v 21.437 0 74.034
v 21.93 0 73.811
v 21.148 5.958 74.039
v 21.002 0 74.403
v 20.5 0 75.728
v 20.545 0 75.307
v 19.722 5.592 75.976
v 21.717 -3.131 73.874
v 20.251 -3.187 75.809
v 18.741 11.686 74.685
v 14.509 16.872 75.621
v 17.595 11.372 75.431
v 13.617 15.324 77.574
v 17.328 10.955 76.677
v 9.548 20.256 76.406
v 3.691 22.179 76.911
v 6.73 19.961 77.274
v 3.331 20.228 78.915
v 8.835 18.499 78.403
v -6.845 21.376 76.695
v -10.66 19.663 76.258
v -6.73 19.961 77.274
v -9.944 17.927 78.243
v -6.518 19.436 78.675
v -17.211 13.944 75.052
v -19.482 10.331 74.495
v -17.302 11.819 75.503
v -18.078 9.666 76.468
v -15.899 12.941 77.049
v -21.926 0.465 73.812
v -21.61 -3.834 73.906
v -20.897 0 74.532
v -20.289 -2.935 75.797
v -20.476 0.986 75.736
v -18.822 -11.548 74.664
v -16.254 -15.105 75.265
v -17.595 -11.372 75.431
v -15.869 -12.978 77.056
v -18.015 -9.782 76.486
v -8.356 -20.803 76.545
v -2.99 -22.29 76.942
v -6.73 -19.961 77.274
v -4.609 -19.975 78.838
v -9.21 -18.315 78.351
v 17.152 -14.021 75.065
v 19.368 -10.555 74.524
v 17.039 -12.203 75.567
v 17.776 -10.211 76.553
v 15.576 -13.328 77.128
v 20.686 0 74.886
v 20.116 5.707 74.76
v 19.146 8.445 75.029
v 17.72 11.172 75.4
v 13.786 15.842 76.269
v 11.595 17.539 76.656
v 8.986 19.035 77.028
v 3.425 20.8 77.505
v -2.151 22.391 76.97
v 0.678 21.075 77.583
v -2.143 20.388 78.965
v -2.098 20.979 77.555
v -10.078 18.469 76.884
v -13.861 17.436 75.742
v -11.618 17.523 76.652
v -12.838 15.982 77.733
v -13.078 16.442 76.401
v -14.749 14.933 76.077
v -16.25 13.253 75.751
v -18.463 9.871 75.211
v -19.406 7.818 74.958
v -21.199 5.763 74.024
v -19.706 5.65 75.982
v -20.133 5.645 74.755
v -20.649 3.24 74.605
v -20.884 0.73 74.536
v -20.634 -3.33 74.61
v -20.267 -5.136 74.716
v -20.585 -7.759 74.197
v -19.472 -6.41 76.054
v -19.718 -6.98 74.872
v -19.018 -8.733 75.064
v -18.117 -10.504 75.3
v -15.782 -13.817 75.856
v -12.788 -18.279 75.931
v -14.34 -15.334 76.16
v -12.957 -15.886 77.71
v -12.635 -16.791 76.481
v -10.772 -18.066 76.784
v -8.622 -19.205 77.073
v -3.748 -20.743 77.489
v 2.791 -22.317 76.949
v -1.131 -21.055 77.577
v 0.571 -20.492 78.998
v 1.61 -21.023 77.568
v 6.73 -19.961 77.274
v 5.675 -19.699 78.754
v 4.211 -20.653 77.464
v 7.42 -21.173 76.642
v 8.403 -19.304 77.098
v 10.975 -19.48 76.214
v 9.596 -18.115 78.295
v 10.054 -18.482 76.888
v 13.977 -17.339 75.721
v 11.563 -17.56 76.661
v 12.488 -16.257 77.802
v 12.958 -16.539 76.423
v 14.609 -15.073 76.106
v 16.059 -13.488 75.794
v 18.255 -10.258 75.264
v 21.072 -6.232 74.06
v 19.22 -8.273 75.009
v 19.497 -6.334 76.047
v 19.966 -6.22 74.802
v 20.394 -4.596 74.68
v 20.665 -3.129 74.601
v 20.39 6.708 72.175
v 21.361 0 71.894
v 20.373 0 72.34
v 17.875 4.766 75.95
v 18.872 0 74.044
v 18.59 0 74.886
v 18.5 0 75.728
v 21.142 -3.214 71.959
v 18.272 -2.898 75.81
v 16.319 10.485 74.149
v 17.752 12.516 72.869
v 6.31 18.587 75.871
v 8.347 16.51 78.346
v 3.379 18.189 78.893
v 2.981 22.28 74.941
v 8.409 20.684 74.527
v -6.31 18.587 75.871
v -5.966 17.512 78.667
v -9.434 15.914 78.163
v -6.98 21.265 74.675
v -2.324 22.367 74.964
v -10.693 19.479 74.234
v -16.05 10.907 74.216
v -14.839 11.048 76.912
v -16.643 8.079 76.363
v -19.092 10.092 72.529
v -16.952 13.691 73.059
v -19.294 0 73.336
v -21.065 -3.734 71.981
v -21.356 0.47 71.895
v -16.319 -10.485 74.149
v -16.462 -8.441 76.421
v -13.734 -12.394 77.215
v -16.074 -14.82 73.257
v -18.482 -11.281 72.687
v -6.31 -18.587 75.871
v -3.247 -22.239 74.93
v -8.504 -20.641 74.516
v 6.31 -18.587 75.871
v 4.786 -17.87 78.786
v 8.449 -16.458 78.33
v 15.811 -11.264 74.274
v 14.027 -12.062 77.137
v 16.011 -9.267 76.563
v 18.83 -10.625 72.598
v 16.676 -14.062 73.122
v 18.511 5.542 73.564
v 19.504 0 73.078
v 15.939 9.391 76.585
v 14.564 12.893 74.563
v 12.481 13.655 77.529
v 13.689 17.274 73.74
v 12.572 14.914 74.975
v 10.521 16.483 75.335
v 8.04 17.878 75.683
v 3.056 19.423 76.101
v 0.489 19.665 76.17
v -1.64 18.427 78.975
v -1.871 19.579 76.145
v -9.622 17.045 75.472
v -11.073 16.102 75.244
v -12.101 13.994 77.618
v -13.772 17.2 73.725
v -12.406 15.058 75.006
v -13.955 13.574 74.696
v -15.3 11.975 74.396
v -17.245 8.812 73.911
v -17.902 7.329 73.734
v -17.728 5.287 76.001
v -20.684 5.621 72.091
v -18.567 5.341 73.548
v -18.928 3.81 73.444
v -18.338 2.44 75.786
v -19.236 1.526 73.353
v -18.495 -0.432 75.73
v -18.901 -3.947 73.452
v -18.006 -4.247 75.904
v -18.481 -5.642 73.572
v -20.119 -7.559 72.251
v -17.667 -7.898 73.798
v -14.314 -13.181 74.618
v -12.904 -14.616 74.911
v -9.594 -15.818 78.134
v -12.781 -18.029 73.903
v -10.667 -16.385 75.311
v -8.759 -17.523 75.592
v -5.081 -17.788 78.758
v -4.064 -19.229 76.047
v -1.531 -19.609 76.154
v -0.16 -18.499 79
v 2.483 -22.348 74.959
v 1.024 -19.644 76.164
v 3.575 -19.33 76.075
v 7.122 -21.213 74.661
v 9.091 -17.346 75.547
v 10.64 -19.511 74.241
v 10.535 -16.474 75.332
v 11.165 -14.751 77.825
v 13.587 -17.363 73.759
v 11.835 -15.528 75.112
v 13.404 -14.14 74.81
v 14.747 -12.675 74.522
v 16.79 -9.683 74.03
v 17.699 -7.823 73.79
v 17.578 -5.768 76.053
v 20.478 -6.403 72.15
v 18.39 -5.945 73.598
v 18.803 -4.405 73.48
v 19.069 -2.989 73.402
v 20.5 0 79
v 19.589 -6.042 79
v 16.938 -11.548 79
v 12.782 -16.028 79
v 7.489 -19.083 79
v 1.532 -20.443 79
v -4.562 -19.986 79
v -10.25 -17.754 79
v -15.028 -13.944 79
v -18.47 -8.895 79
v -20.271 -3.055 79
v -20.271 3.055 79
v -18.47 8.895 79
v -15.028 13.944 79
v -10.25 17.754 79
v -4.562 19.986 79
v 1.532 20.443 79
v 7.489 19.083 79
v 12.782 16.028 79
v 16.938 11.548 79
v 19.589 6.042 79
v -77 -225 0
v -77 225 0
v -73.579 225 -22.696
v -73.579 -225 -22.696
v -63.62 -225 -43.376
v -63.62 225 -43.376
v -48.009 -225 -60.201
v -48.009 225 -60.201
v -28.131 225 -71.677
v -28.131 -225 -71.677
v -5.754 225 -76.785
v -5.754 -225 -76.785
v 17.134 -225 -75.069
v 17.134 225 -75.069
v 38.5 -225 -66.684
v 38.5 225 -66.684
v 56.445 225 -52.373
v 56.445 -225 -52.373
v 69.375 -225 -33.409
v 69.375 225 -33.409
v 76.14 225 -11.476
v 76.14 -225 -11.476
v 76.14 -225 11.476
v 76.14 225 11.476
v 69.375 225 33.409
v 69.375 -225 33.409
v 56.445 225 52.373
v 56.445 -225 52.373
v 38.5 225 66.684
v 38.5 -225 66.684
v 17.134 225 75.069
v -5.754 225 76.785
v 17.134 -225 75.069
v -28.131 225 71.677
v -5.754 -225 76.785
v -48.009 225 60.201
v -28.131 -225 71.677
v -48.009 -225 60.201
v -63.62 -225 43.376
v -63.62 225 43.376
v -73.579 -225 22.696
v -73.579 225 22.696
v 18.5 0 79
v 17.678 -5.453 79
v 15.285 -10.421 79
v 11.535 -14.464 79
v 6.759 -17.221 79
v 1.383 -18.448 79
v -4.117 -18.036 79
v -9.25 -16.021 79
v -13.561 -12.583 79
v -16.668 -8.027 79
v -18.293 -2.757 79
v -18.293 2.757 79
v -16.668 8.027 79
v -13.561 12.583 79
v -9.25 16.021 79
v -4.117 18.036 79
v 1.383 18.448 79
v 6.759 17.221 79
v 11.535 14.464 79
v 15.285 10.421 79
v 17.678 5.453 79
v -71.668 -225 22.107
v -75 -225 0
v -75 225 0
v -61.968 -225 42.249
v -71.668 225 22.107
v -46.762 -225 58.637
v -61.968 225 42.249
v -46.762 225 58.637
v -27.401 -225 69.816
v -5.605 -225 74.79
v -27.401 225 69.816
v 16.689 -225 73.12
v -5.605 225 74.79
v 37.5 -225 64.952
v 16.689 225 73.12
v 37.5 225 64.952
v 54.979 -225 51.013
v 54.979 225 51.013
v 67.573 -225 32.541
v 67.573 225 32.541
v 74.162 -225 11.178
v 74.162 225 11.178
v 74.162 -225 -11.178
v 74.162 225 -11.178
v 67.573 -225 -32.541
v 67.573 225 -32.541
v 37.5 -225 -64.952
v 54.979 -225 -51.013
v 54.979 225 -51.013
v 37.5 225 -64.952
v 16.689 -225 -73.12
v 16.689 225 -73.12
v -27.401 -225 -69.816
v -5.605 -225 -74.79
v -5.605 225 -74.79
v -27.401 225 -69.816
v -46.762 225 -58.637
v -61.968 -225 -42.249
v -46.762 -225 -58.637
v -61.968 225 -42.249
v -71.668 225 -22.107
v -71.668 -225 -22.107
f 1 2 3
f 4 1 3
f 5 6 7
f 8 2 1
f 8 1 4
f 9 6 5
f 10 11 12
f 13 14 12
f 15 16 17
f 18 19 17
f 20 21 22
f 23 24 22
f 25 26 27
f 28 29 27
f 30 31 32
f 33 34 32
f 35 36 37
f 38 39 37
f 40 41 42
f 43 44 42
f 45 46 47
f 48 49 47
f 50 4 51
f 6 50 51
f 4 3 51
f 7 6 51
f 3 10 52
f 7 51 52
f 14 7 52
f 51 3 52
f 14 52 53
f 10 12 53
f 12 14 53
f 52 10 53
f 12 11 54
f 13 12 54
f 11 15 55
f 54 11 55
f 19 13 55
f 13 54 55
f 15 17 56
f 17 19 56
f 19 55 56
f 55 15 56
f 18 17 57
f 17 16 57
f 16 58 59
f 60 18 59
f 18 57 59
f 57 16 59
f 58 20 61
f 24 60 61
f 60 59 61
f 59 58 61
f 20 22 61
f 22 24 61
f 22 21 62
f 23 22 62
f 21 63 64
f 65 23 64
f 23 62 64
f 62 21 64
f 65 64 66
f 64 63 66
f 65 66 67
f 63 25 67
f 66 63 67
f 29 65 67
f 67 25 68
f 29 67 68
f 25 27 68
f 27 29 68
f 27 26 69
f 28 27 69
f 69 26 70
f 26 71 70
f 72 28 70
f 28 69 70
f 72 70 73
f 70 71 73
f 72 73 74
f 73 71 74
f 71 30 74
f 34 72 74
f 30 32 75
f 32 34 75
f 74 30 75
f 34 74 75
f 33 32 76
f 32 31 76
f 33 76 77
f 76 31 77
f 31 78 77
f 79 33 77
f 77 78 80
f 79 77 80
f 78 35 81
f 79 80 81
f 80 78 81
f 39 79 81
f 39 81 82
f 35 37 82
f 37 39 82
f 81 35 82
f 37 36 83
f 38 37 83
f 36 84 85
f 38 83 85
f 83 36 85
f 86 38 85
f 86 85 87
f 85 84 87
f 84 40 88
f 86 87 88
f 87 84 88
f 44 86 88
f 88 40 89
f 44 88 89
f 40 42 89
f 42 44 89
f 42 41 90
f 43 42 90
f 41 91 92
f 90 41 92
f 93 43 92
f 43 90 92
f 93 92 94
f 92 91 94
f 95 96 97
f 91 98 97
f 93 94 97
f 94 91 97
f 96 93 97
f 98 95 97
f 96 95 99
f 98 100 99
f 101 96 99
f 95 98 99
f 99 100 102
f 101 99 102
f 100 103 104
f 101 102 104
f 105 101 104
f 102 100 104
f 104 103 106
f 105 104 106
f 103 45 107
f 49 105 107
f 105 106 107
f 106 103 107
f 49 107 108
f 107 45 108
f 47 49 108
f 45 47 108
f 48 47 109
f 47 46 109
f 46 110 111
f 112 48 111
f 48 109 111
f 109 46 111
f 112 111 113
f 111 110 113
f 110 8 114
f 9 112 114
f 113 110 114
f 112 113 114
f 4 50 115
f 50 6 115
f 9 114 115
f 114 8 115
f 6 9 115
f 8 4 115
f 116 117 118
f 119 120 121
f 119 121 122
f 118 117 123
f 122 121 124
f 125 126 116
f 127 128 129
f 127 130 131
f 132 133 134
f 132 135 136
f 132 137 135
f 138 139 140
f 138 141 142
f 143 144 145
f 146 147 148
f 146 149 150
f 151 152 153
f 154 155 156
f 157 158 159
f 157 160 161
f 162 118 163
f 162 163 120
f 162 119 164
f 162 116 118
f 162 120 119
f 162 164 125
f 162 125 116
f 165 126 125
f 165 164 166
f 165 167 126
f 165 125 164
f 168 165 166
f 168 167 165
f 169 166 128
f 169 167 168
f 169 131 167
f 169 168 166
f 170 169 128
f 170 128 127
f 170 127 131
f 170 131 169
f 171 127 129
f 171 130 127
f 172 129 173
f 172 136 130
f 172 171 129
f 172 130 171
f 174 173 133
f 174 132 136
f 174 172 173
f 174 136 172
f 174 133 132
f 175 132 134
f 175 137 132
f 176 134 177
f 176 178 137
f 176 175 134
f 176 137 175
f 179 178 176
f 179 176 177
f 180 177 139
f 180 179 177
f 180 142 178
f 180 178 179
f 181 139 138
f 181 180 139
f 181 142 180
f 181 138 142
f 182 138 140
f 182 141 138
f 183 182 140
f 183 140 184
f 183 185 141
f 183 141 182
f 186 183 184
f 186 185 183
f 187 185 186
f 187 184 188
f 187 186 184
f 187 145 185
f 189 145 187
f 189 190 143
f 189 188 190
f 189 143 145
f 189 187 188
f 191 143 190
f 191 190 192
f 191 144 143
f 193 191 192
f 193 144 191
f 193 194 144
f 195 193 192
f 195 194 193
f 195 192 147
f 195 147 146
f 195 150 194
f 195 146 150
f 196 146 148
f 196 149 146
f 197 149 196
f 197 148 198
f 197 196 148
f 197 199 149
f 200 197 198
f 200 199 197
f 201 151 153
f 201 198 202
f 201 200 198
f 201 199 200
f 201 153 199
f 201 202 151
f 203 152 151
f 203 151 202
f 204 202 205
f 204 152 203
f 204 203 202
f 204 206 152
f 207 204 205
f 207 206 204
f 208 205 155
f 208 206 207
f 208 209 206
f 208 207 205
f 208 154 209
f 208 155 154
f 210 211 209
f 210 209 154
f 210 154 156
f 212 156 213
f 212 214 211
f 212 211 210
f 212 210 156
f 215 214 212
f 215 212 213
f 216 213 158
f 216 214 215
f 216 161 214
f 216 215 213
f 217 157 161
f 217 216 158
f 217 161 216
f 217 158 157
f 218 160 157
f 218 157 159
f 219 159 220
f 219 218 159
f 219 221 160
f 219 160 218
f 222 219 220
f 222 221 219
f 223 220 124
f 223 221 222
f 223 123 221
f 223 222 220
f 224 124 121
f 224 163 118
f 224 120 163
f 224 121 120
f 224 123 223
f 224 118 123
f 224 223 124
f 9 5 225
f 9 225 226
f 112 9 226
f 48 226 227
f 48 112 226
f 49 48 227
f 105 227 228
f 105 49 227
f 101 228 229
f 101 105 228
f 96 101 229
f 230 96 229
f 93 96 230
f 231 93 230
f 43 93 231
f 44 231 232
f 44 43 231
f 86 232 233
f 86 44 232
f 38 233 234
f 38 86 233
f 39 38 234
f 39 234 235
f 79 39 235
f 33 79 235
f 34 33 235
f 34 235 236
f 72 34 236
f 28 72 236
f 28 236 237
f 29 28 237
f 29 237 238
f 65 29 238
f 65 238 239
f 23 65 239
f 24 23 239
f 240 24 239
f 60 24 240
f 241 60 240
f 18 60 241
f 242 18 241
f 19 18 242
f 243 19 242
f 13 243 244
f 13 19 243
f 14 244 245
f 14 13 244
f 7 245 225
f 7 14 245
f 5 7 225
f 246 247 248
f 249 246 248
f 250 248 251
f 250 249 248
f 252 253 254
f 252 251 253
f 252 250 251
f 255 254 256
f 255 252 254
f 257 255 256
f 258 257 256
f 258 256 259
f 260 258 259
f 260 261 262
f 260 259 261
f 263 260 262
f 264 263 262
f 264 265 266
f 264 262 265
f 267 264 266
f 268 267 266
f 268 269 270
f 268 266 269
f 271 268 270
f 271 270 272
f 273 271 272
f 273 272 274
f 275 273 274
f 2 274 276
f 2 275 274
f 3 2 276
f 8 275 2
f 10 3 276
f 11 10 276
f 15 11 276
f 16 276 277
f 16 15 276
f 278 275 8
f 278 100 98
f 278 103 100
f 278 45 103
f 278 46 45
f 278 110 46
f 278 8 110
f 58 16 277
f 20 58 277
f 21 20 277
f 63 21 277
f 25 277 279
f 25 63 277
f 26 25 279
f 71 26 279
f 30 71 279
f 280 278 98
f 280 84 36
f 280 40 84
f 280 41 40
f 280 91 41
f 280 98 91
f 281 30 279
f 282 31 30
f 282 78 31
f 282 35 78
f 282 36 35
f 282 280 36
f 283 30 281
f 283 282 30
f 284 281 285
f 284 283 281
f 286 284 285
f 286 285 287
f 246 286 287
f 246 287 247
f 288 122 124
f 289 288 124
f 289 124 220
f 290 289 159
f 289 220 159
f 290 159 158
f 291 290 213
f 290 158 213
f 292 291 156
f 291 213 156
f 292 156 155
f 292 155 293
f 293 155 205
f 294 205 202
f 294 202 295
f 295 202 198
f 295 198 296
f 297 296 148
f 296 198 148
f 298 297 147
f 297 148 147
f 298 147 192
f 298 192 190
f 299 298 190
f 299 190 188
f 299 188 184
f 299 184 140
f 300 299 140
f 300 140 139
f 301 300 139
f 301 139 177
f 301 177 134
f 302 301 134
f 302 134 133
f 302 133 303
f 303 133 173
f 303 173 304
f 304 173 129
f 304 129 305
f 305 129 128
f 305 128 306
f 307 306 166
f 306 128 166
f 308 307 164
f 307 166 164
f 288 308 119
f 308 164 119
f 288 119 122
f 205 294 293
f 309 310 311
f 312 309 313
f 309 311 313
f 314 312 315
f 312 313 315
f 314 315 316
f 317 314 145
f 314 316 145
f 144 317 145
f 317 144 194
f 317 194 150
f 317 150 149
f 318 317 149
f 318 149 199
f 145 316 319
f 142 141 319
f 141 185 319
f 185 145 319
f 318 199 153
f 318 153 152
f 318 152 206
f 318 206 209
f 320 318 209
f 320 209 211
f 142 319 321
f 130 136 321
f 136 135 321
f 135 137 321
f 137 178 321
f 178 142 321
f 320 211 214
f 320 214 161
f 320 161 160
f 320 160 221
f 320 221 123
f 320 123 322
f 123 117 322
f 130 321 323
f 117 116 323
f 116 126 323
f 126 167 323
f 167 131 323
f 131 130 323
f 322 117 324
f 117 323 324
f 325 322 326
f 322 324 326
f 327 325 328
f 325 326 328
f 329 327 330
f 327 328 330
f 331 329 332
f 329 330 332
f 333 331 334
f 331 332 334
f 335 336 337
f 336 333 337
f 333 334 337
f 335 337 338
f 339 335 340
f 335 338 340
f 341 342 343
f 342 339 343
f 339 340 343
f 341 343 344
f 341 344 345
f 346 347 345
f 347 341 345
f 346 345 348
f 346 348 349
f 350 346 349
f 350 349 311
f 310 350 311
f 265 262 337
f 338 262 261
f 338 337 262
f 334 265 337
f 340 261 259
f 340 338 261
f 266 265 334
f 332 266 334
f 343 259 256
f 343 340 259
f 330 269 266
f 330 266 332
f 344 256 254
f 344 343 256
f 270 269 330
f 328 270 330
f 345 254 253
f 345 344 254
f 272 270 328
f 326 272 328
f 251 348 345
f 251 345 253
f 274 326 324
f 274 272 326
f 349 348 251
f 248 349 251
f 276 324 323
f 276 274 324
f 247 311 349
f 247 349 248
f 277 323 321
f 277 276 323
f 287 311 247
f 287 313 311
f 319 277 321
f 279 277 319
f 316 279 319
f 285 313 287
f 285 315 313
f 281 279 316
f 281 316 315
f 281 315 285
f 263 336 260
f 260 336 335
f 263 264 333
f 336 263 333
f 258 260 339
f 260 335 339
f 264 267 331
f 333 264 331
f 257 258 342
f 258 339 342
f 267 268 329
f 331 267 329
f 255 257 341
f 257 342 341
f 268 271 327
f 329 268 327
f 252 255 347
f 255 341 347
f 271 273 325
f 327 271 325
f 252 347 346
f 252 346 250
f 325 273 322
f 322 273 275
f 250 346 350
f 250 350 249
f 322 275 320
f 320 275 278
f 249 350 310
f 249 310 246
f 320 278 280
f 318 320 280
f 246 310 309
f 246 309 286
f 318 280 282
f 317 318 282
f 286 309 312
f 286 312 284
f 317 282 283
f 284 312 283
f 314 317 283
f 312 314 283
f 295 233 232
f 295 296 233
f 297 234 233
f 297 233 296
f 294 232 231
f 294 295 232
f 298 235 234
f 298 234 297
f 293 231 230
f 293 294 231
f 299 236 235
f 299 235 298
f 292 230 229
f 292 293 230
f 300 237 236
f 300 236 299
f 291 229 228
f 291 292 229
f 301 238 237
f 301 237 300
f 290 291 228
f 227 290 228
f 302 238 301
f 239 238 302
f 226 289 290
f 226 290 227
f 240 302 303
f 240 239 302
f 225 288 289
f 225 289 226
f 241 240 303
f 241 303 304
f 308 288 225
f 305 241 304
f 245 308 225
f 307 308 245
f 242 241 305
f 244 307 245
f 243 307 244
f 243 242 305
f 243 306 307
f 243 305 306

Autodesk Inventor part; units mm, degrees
ref_plane "YZ Plane" through (0, 0, 0) normal (1, 0, 0) x (0, 1, 0)
ref_plane "XZ Plane" through (0, 0, 0) normal (0, 1, 0) x (-1, 0, 0)
ref_plane "XY Plane" through (0, 0, 0) normal (0, 0, 1) x (1, 0, 0)
sketch "Szkic8" plane through (0, 0, 0) normal (0, 1, 0) x (-1, 0, 0)
  circle A0 centre (0, 0) radius 77
  circle A1 centre (0, 0) radius 75
  dimension "d53" = 154
  dimension "d54" = 2
extrude "Wyciągnięcie proste2" add sketch "Szkic8" along normal mid plane 450
sketch "Szkic13" plane through (0, 0, 0) normal (0, 0, 1) x (1, 0, 0)
  circle A0 centre (0, 0) radius 20.5
  circle A1 centre (0, 0) radius 18.5
  dimension "d67" = 41
  dimension "d68" = 2
extrude "Wyciągnięcie proste6" add sketch "Szkic13" along normal blind 79
sketch "Szkic14" plane through (0, 0, 79) normal (0, 0, 1) x (1, 0, 0)
  circle A0 centre (0, 0) radius 18.5 projected
extrude "Wyciągnięcie proste7" cut sketch "Szkic14" against normal blind 79
sketch "Szkic15" plane through (0, -225, 0) normal (0, -1, 0) x (1, 0, 0)
  circle A0 centre (0, 0) radius 75 projected
extrude "Wyciągnięcie proste8" cut sketch "Szkic15" against normal blind 450
fillet "Zaokrąglenie3" radius 2 2 edges at (0, 20.5, 77) (-0.0041, -20.5, 77)
fillet "Zaokrąglenie4" radius 4 2 edges at (-0.0039, -18.5, 75) (0, 18.5, 75)
equation "\"d53\" = OD"
equation "\"d54\" = THK"
equation "\"d55\" = L1"
equation "\"d67\" = OD2"
equation "\"d68\" = THK"
equation "\"d69\" = L2"
equation "\"d71\" = L2"
equation "\"d73\" = L1"
equation "\"d75\" = THK"
equation "\"d76\" = 2 * THK"
equation "\"SzerokośćGięciaPodcięcia\" = Grubość"
equation "\"RozmiarPodcięciaNarożnika\" = 4 * Grubość"
equation "\"PromieńPrzejścia\" = PromieńGięcia"
equation "\"Rozmiar_promienia_Jacobiego\" = PromieńGięcia"
equation "\"Wielk_odstępu\" = Grubość"
equation "\"d2\" = PromieńGięcia"
equation "\"d23\" = PromieńGięcia"
equation "\"OD\" = 154"
equation "\"THK\" = 2"
equation "\"L1\" = 450"
equation "\"L2\" = 79"
equation "\"OD2\" = 41"
equation "\"Grubość\" = 1.5"
equation "\"PromieńGięcia\" = 3"
properties part number "Trójnik red. krótki  Ø154 41 154 s=2 L=450" material "304"
